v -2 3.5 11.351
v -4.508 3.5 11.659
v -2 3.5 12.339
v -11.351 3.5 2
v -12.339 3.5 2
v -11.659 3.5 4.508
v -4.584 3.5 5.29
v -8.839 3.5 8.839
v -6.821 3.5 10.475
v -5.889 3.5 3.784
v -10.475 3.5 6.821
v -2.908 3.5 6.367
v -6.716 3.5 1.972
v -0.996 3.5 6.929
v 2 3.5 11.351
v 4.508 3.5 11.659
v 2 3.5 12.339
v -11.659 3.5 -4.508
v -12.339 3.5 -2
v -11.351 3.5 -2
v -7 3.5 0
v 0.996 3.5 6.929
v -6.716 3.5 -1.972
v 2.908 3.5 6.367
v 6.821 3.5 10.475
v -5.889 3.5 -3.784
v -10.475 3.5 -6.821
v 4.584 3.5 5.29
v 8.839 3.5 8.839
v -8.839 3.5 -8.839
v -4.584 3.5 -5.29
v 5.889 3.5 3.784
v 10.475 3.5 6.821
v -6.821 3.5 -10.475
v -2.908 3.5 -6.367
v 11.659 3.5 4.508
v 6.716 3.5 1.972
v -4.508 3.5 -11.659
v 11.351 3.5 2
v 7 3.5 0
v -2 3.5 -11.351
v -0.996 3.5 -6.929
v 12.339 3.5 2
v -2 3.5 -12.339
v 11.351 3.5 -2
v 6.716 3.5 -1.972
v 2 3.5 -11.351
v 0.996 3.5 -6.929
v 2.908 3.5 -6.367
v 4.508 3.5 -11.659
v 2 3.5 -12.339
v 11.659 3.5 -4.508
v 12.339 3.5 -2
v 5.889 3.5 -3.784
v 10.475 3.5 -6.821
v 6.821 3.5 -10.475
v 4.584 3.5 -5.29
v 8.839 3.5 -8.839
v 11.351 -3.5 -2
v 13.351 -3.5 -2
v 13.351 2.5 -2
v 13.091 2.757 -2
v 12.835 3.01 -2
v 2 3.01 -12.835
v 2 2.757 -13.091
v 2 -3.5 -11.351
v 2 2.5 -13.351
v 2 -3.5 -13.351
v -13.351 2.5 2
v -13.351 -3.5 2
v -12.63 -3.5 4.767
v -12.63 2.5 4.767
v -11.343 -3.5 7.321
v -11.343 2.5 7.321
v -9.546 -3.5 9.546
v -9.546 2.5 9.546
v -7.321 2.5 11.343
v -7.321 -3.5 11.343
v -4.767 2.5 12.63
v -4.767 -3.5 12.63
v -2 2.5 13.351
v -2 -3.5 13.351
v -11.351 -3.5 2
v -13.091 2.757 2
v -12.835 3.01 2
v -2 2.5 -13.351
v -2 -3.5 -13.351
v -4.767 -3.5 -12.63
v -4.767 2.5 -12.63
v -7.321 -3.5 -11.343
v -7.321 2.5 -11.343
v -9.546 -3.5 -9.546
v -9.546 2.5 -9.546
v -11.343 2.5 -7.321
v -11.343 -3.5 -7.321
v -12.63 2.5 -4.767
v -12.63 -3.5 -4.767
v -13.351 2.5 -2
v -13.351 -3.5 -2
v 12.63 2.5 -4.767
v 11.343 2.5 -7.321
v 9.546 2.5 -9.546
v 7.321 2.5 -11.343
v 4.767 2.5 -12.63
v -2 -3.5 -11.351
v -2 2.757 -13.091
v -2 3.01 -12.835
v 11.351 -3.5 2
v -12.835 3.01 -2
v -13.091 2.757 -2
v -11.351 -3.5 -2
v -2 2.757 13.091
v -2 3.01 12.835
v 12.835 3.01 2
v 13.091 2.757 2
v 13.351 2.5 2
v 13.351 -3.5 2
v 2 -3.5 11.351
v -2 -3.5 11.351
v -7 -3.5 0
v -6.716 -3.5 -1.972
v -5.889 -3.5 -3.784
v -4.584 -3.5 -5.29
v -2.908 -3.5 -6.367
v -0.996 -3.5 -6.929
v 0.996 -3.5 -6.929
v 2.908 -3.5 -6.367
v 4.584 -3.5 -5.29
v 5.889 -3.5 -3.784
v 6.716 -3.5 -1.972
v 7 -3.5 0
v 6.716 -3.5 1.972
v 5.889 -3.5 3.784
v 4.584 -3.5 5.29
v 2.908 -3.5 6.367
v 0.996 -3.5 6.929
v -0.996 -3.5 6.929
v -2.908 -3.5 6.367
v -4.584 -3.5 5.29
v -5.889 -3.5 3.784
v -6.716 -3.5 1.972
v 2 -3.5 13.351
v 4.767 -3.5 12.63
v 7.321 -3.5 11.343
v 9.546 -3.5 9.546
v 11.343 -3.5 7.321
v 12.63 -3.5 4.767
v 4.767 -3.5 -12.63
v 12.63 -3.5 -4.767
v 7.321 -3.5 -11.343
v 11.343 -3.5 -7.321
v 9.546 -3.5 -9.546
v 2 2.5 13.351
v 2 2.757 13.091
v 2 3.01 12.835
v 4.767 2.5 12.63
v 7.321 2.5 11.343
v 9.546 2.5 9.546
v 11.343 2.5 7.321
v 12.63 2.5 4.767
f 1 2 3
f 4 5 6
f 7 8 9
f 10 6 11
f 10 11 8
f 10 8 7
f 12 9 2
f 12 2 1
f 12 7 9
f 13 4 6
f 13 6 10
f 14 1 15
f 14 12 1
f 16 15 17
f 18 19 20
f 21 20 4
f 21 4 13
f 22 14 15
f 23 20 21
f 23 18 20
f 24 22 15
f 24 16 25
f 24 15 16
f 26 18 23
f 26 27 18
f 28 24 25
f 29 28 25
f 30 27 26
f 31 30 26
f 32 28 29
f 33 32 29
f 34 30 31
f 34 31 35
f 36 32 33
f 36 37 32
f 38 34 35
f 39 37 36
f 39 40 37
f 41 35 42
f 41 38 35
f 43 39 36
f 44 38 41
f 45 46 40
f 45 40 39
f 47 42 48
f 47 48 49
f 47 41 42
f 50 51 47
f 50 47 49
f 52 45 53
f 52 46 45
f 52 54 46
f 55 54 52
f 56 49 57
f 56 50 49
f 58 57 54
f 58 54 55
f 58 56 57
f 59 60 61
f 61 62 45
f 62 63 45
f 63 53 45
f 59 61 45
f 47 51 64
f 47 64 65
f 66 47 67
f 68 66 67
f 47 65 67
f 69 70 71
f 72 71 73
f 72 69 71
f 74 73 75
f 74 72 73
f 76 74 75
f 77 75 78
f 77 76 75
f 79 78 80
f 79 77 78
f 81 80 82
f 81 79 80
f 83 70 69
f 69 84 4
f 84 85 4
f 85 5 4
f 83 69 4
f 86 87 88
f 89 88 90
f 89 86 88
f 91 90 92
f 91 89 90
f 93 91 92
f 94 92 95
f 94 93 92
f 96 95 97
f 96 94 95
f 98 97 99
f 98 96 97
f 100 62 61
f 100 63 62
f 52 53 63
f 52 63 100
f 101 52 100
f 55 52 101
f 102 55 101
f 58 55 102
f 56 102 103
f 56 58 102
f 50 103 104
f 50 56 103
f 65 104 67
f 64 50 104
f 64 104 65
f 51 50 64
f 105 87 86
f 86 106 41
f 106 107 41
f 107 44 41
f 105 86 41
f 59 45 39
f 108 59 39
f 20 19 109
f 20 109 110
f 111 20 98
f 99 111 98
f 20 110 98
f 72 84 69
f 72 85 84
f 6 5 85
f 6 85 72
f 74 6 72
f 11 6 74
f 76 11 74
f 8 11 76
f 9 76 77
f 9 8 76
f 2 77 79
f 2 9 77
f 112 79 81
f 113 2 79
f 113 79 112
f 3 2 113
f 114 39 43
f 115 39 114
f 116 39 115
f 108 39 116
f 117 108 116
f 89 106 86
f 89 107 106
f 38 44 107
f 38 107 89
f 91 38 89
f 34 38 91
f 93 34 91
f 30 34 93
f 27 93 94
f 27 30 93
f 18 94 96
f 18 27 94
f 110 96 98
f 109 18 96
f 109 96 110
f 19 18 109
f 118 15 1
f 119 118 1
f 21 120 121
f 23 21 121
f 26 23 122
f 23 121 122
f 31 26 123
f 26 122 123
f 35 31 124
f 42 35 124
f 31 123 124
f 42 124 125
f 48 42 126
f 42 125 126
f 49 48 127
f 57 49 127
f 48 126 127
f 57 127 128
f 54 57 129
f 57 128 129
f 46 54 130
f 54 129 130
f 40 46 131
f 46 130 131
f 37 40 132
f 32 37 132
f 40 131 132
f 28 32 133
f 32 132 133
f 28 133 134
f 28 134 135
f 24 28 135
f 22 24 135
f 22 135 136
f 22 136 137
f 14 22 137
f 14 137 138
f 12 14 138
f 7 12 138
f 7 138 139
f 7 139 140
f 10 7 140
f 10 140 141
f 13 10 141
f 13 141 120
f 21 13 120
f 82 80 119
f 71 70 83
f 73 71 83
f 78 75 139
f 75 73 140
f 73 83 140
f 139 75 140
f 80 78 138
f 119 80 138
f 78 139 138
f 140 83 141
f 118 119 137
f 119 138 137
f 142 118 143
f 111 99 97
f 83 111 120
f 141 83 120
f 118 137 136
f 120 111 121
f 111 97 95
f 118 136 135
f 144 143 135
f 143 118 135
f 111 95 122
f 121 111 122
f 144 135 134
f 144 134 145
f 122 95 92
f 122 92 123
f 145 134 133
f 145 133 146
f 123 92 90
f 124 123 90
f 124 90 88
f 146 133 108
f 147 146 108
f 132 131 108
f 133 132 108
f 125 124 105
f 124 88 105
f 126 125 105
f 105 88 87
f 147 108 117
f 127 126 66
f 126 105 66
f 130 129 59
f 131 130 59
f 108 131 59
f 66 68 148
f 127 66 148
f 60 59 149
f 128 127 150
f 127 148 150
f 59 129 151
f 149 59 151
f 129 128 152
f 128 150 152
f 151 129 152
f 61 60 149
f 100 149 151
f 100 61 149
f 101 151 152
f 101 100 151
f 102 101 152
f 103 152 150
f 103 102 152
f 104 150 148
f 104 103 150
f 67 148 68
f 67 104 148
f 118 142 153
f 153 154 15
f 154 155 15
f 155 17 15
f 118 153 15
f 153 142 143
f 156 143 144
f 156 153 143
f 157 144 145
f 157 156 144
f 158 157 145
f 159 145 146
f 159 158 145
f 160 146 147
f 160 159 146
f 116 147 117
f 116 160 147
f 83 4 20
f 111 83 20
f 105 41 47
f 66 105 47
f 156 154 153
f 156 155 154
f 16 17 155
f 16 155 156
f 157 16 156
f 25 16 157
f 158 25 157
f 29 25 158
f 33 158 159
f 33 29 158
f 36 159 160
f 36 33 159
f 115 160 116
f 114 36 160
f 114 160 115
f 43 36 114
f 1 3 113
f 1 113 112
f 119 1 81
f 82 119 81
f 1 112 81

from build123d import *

# Parameters (mm, degrees)
SKETCH1_R               = 13.5
BOSS_EXTRUDE1_DEPTH     = 3.5
CUT_EXTRUDE1_DEPTH      = 4.5
CUT_EXTRUDE1_DEPTH_BACK = 4.5
CHAMFER1_SIZE           = 1
M16_TAPPED_HOLE1_D      = 14
M16_TAPPED_HOLE1_DEPTH  = 7


with BuildPart() as part:
    # Sketch1 → Boss-Extrude1 (new body, symmetric)
    with BuildSketch(Plane(origin=(0, 0, 0), x_dir=(1, 0, 0), z_dir=(0, 1, 0))):
        Circle(SKETCH1_R)
    extrude(amount=BOSS_EXTRUDE1_DEPTH, both=True)

    # Sketch2 → Cut-Extrude1 (cut, two sides)
    with BuildSketch(Plane(origin=(0, 0, 0), x_dir=(1, 0, 0), z_dir=(0, 1, 0))) as cut_extrude1_sk:
        with BuildLine():
            Line((-2, 13.351029923), (-2, 11.351029923))
            Line((-2, 11.351029923), (2, 11.351029923))
            Line((2, 11.351029923), (2, 13.351029923))
            ThreePointArc((2, 13.351029923), (0, 13.5), (-2, 13.351029923))
        make_face()
        with BuildLine():
            Line((13.351029923, 2), (11.351029923, 2))
            Line((11.351029923, 2), (11.351029923, -2))
            Line((11.351029923, -2), (13.351029923, -2))
            ThreePointArc((13.351029923, -2), (13.5, 0), (13.351029923, 2))
        make_face()
        with BuildLine():
            Line((2, -13.351029923), (2, -11.351029923))
            Line((2, -11.351029923), (-2, -11.351029923))
            Line((-2, -11.351029923), (-2, -13.351029923))
            ThreePointArc((-2, -13.351029923), (0, -13.5), (2, -13.351029923))
        make_face()
        with BuildLine():
            Line((-13.351029923, -2), (-11.351029923, -2))
            Line((-11.351029923, -2), (-11.351029923, 2))
            Line((-11.351029923, 2), (-13.351029923, 2))
            ThreePointArc((-13.351029923, 2), (-13.5, 0), (-13.351029923, -2))
        make_face()
    extrude(amount=CUT_EXTRUDE1_DEPTH, mode=Mode.SUBTRACT)
    extrude(cut_extrude1_sk.sketch, amount=-CUT_EXTRUDE1_DEPTH_BACK, mode=Mode.SUBTRACT)

    # Chamfer1
    chamfer1_edges = [part.edges().sort_by_distance(p)[0] for p in [
        (9.545941546, 3.5, -9.545941546),
        (-9.545941546, 3.5, -9.545941546),
        (-9.545941546, 3.5, 9.545941546),
        (9.545941546, 3.5, 9.545941546),
    ]]
    chamfer(chamfer1_edges, length=CHAMFER1_SIZE)

    # M16 Tapped Hole1
    with Locations(Plane(origin=(0, 3.5, 0), x_dir=(1, 0, 0), z_dir=(0, 1, 0))):
        with Locations((0, 0)):
            Hole(M16_TAPPED_HOLE1_D / 2, depth=M16_TAPPED_HOLE1_DEPTH)


solid = part.part
